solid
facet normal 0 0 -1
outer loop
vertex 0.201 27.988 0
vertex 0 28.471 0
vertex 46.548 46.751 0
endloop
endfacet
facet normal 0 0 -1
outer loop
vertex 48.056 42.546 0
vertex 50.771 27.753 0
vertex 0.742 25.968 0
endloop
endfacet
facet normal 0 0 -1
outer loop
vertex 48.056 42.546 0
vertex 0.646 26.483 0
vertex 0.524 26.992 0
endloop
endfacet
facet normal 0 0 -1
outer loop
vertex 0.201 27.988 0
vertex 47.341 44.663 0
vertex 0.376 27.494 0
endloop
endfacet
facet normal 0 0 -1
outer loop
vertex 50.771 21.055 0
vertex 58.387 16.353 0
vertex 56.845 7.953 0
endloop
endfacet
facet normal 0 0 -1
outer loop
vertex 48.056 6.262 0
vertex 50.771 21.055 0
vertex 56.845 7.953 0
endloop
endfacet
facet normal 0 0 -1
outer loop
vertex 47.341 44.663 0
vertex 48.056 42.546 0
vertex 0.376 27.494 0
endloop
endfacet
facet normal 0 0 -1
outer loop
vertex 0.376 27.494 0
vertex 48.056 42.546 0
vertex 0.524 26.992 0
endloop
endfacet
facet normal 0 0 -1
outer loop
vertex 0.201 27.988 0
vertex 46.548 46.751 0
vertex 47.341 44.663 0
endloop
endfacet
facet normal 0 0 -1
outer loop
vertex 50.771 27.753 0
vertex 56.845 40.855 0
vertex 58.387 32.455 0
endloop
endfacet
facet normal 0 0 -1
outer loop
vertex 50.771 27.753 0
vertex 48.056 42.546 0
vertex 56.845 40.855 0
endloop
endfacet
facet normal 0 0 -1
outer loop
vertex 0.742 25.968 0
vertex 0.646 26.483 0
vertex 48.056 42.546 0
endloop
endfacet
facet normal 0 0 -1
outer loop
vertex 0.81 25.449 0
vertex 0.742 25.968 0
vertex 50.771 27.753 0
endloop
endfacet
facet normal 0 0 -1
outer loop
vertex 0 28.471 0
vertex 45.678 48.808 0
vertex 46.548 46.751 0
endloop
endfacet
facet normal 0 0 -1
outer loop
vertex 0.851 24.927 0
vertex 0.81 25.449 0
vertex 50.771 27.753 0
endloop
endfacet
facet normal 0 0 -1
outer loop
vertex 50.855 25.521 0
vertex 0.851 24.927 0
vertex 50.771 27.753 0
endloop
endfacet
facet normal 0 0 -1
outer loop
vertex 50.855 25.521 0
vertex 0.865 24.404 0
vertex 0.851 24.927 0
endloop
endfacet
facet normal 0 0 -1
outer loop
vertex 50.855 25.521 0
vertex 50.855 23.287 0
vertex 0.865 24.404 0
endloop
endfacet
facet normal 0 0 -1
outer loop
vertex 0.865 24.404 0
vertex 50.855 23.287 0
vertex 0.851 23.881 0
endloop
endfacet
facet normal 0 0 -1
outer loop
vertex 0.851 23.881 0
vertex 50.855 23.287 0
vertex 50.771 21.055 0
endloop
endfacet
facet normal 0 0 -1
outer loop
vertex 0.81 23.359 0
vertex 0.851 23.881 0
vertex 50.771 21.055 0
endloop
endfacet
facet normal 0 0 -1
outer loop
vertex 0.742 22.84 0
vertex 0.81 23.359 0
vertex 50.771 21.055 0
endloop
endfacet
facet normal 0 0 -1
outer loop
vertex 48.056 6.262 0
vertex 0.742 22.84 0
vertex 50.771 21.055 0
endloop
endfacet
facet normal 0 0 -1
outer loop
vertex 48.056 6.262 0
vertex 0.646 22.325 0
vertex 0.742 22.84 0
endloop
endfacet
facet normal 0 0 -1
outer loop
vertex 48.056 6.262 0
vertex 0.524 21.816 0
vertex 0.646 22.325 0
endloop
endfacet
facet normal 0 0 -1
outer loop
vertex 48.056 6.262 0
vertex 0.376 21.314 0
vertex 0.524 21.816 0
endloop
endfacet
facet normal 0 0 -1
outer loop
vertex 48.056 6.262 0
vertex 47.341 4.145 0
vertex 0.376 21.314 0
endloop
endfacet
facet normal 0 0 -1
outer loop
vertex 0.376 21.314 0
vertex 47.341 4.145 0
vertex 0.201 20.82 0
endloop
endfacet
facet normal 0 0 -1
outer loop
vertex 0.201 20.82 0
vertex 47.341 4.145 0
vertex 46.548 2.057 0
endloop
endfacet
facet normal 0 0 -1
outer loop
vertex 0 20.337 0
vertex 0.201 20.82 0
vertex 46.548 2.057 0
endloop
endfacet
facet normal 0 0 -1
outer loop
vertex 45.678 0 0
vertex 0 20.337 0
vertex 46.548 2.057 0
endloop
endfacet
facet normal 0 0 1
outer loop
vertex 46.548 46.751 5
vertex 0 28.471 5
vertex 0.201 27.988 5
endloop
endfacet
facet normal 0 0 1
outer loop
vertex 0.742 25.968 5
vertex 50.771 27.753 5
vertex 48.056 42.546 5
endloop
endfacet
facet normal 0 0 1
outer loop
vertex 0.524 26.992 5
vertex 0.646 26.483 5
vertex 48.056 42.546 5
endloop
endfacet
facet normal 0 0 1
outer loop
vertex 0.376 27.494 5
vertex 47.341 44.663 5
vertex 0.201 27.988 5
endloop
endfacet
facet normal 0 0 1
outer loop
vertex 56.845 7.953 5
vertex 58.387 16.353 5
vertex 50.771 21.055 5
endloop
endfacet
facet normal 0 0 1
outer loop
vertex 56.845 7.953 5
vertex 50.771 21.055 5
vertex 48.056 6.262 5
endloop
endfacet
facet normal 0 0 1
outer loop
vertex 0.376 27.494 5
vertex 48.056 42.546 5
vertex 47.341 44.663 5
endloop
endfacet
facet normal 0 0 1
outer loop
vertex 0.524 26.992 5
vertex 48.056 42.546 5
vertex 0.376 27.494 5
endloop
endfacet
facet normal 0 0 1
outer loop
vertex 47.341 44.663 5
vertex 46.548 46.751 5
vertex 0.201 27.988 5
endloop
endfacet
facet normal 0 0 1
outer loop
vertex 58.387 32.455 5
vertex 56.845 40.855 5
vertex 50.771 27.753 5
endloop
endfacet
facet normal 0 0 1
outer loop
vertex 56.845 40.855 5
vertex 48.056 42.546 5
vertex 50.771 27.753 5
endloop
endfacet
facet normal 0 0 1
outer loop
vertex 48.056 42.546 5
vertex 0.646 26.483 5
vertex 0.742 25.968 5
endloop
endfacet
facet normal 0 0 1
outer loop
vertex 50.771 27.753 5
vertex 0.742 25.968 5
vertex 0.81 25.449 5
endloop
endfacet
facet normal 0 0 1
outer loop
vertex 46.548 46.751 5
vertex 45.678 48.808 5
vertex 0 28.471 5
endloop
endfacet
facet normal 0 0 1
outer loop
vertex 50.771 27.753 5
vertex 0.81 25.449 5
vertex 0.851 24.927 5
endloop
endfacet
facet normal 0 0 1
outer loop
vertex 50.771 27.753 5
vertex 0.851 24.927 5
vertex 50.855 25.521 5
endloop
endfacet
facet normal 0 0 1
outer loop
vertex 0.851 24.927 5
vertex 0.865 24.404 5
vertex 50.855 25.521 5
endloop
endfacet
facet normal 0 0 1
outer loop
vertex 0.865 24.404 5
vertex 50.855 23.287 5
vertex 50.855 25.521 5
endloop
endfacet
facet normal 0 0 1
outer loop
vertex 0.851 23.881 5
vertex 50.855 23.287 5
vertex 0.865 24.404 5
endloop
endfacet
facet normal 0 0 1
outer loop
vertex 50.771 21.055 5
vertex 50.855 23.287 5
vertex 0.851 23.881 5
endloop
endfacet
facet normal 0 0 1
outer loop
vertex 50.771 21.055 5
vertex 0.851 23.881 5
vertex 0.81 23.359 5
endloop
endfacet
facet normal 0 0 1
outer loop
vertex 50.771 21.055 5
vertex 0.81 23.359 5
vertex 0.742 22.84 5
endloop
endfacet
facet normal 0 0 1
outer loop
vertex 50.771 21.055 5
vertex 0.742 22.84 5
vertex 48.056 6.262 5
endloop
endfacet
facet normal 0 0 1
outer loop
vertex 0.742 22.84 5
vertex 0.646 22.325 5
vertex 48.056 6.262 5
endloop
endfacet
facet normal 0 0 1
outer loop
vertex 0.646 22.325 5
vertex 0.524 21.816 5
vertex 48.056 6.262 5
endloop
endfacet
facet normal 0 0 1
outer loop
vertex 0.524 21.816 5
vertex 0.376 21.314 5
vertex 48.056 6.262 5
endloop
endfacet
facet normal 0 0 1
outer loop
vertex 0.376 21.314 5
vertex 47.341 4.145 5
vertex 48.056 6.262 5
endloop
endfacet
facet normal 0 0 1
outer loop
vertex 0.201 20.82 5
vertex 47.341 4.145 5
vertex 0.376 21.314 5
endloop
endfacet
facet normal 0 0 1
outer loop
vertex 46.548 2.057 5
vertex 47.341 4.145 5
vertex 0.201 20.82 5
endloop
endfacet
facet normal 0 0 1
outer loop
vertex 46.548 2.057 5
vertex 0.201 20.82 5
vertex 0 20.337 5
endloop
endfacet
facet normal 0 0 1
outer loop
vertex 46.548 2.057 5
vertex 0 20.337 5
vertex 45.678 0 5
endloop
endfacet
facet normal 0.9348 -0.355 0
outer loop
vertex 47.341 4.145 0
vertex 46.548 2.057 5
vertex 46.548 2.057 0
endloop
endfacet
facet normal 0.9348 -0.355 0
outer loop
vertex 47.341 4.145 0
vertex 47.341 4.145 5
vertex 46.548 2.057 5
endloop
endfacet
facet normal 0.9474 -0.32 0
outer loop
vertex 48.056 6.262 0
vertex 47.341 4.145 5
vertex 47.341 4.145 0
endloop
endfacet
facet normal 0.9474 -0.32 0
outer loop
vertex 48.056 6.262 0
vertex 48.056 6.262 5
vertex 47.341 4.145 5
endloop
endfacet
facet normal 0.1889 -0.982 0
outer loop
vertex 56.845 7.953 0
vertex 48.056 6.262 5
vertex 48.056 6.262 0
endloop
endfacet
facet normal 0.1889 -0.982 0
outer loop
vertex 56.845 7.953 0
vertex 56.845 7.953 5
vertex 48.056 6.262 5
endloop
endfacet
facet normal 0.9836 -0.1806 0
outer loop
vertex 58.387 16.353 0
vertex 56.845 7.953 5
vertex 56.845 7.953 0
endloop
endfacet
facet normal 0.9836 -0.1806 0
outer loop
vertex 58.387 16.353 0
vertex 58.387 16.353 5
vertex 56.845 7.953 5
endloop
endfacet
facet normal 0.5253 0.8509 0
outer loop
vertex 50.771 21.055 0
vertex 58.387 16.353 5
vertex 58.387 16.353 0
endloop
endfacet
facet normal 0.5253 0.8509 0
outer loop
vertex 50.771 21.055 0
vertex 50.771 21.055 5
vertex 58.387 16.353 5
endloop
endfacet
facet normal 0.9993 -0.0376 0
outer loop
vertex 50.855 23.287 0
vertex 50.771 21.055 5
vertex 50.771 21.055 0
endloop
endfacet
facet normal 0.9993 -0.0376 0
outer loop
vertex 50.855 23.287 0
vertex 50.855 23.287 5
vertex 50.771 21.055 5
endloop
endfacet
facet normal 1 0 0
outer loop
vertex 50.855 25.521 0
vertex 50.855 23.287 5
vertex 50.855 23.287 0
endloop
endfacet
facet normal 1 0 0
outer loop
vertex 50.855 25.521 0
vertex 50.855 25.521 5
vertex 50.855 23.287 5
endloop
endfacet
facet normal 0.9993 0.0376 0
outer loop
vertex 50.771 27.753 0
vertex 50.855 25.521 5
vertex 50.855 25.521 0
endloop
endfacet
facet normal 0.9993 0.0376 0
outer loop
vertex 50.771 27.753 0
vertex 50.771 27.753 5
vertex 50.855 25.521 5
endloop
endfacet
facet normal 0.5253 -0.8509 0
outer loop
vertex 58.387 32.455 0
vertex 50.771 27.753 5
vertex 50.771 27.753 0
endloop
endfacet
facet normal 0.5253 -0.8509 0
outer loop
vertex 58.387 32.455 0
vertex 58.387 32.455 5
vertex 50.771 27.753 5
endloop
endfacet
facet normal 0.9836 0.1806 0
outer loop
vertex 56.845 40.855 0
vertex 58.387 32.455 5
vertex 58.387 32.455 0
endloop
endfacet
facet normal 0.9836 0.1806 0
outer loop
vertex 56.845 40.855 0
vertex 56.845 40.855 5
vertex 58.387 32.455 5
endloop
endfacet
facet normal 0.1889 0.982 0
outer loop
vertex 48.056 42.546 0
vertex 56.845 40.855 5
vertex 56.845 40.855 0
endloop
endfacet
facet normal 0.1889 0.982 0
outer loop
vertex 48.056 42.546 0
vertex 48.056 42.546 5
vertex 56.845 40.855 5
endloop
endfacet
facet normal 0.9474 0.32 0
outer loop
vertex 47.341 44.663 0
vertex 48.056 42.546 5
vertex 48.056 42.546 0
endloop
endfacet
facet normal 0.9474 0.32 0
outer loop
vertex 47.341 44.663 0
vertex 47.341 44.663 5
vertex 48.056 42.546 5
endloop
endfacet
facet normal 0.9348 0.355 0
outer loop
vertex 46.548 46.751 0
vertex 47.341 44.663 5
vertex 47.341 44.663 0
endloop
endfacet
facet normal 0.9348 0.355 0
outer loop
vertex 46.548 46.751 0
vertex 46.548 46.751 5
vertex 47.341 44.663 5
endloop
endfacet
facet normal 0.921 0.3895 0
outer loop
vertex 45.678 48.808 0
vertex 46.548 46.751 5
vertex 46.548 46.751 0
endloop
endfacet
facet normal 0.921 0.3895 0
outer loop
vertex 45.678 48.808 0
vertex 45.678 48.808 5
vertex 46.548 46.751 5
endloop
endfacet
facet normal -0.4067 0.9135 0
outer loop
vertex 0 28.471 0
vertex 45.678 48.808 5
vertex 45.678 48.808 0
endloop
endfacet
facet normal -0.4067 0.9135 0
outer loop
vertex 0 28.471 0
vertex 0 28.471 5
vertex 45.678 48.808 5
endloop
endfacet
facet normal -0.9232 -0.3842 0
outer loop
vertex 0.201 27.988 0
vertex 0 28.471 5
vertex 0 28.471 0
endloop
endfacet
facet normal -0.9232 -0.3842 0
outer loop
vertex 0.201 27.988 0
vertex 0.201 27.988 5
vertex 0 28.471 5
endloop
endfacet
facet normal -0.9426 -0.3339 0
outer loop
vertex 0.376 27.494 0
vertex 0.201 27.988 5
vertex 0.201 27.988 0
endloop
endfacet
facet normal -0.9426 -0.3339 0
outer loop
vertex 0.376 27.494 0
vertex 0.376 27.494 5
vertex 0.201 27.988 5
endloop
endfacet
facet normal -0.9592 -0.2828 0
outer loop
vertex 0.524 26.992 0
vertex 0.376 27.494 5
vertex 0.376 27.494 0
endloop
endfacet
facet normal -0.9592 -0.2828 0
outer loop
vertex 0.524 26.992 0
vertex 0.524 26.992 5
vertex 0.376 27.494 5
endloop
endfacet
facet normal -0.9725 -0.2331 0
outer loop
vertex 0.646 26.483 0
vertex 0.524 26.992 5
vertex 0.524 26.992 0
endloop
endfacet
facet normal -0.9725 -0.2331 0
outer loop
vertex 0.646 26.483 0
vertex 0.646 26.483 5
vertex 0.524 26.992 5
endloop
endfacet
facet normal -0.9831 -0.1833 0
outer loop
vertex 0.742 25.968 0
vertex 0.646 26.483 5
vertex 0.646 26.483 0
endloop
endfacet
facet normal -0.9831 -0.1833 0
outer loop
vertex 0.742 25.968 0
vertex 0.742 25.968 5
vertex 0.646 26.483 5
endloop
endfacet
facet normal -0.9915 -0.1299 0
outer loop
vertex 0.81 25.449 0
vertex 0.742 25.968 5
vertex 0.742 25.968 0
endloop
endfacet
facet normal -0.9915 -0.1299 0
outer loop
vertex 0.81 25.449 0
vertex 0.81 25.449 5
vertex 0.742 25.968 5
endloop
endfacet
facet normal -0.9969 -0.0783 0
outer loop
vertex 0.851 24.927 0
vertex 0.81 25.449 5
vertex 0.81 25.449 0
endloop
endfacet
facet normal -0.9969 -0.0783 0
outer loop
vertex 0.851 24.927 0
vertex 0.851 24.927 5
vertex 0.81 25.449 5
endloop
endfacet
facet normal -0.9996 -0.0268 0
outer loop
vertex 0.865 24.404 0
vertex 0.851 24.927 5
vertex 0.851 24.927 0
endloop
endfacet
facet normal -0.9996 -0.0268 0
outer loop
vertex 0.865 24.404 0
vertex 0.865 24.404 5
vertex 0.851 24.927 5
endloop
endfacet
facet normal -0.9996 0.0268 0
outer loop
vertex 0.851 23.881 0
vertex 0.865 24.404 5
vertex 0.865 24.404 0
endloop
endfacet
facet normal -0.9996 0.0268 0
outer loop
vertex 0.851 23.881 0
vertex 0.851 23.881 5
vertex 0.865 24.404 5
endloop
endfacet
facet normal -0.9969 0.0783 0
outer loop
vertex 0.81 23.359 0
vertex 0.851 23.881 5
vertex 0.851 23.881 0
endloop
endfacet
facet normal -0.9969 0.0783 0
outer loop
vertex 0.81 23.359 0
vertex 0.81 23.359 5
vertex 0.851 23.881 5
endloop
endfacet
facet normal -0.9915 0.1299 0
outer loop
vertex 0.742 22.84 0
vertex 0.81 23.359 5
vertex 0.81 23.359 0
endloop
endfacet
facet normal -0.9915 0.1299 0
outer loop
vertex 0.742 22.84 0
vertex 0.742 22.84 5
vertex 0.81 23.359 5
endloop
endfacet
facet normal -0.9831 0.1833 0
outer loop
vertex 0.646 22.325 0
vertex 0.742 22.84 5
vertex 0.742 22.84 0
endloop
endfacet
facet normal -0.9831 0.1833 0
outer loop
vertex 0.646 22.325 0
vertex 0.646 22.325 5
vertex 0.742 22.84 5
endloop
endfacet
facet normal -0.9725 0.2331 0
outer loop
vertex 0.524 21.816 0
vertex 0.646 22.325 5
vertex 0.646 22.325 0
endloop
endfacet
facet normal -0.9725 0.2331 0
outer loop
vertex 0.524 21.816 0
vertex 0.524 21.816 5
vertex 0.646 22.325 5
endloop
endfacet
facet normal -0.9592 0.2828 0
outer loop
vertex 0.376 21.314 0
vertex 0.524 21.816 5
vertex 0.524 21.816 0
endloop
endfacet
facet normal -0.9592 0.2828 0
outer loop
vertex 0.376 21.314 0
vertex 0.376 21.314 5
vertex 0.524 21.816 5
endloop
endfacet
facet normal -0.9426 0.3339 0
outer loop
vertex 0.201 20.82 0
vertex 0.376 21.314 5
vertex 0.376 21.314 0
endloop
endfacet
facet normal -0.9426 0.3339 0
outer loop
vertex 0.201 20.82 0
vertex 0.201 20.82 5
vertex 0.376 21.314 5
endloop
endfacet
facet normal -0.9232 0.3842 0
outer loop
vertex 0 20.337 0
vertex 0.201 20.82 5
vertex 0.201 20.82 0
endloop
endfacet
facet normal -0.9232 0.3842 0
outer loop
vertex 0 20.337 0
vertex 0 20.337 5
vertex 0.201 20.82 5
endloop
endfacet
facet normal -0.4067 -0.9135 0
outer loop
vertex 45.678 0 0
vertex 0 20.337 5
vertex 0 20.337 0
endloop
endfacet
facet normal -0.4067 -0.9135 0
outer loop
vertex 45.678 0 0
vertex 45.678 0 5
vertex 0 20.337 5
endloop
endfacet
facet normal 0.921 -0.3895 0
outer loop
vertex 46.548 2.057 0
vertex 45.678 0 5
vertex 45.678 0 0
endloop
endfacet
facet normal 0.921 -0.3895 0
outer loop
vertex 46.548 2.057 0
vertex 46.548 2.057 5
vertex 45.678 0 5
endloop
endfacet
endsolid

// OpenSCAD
$fn = 32;

// ----------------------------------------------------------------------
// Gear sector: 2 teeth on 48 degrees
// ----------------------------------------------------------------------

// --- parameters (mm) ---
sector_angle = 48;        // sector angle, degrees
root_r = 60;              // root circle radius
tooth_h = 8;              // tooth height over the root circle
teeth = 2;                // number of teeth on the sector
hub_r = 10;               // hub bore radius
plate_t = 5;              // sector thickness, Z
arc_step = 3;             // sampling step of the root/hub arcs, degrees

tip_r = root_r + tooth_h;  // tip circle radius

profile = [[45.678, 0], [46.548, 2.057], [47.341, 4.145], [48.056, 6.262], [56.845, 7.953], [58.387, 16.353], [50.771, 21.055], [50.855, 23.287], [50.855, 25.521], [50.771, 27.753], [58.387, 32.455], [56.845, 40.855], [48.056, 42.546], [47.341, 44.663], [46.548, 46.751], [45.678, 48.808], [0, 28.471], [0.201, 27.988], [0.376, 27.494], [0.524, 26.992], [0.646, 26.483], [0.742, 25.968], [0.81, 25.449], [0.851, 24.927], [0.865, 24.404], [0.851, 23.881], [0.81, 23.359], [0.742, 22.84], [0.646, 22.325], [0.524, 21.816], [0.376, 21.314], [0.201, 20.82], [0, 20.337]];  // primary outline, 33 points, counter clockwise

// --- the one profile operation ---
linear_extrude(height = plate_t) polygon(points = profile);
